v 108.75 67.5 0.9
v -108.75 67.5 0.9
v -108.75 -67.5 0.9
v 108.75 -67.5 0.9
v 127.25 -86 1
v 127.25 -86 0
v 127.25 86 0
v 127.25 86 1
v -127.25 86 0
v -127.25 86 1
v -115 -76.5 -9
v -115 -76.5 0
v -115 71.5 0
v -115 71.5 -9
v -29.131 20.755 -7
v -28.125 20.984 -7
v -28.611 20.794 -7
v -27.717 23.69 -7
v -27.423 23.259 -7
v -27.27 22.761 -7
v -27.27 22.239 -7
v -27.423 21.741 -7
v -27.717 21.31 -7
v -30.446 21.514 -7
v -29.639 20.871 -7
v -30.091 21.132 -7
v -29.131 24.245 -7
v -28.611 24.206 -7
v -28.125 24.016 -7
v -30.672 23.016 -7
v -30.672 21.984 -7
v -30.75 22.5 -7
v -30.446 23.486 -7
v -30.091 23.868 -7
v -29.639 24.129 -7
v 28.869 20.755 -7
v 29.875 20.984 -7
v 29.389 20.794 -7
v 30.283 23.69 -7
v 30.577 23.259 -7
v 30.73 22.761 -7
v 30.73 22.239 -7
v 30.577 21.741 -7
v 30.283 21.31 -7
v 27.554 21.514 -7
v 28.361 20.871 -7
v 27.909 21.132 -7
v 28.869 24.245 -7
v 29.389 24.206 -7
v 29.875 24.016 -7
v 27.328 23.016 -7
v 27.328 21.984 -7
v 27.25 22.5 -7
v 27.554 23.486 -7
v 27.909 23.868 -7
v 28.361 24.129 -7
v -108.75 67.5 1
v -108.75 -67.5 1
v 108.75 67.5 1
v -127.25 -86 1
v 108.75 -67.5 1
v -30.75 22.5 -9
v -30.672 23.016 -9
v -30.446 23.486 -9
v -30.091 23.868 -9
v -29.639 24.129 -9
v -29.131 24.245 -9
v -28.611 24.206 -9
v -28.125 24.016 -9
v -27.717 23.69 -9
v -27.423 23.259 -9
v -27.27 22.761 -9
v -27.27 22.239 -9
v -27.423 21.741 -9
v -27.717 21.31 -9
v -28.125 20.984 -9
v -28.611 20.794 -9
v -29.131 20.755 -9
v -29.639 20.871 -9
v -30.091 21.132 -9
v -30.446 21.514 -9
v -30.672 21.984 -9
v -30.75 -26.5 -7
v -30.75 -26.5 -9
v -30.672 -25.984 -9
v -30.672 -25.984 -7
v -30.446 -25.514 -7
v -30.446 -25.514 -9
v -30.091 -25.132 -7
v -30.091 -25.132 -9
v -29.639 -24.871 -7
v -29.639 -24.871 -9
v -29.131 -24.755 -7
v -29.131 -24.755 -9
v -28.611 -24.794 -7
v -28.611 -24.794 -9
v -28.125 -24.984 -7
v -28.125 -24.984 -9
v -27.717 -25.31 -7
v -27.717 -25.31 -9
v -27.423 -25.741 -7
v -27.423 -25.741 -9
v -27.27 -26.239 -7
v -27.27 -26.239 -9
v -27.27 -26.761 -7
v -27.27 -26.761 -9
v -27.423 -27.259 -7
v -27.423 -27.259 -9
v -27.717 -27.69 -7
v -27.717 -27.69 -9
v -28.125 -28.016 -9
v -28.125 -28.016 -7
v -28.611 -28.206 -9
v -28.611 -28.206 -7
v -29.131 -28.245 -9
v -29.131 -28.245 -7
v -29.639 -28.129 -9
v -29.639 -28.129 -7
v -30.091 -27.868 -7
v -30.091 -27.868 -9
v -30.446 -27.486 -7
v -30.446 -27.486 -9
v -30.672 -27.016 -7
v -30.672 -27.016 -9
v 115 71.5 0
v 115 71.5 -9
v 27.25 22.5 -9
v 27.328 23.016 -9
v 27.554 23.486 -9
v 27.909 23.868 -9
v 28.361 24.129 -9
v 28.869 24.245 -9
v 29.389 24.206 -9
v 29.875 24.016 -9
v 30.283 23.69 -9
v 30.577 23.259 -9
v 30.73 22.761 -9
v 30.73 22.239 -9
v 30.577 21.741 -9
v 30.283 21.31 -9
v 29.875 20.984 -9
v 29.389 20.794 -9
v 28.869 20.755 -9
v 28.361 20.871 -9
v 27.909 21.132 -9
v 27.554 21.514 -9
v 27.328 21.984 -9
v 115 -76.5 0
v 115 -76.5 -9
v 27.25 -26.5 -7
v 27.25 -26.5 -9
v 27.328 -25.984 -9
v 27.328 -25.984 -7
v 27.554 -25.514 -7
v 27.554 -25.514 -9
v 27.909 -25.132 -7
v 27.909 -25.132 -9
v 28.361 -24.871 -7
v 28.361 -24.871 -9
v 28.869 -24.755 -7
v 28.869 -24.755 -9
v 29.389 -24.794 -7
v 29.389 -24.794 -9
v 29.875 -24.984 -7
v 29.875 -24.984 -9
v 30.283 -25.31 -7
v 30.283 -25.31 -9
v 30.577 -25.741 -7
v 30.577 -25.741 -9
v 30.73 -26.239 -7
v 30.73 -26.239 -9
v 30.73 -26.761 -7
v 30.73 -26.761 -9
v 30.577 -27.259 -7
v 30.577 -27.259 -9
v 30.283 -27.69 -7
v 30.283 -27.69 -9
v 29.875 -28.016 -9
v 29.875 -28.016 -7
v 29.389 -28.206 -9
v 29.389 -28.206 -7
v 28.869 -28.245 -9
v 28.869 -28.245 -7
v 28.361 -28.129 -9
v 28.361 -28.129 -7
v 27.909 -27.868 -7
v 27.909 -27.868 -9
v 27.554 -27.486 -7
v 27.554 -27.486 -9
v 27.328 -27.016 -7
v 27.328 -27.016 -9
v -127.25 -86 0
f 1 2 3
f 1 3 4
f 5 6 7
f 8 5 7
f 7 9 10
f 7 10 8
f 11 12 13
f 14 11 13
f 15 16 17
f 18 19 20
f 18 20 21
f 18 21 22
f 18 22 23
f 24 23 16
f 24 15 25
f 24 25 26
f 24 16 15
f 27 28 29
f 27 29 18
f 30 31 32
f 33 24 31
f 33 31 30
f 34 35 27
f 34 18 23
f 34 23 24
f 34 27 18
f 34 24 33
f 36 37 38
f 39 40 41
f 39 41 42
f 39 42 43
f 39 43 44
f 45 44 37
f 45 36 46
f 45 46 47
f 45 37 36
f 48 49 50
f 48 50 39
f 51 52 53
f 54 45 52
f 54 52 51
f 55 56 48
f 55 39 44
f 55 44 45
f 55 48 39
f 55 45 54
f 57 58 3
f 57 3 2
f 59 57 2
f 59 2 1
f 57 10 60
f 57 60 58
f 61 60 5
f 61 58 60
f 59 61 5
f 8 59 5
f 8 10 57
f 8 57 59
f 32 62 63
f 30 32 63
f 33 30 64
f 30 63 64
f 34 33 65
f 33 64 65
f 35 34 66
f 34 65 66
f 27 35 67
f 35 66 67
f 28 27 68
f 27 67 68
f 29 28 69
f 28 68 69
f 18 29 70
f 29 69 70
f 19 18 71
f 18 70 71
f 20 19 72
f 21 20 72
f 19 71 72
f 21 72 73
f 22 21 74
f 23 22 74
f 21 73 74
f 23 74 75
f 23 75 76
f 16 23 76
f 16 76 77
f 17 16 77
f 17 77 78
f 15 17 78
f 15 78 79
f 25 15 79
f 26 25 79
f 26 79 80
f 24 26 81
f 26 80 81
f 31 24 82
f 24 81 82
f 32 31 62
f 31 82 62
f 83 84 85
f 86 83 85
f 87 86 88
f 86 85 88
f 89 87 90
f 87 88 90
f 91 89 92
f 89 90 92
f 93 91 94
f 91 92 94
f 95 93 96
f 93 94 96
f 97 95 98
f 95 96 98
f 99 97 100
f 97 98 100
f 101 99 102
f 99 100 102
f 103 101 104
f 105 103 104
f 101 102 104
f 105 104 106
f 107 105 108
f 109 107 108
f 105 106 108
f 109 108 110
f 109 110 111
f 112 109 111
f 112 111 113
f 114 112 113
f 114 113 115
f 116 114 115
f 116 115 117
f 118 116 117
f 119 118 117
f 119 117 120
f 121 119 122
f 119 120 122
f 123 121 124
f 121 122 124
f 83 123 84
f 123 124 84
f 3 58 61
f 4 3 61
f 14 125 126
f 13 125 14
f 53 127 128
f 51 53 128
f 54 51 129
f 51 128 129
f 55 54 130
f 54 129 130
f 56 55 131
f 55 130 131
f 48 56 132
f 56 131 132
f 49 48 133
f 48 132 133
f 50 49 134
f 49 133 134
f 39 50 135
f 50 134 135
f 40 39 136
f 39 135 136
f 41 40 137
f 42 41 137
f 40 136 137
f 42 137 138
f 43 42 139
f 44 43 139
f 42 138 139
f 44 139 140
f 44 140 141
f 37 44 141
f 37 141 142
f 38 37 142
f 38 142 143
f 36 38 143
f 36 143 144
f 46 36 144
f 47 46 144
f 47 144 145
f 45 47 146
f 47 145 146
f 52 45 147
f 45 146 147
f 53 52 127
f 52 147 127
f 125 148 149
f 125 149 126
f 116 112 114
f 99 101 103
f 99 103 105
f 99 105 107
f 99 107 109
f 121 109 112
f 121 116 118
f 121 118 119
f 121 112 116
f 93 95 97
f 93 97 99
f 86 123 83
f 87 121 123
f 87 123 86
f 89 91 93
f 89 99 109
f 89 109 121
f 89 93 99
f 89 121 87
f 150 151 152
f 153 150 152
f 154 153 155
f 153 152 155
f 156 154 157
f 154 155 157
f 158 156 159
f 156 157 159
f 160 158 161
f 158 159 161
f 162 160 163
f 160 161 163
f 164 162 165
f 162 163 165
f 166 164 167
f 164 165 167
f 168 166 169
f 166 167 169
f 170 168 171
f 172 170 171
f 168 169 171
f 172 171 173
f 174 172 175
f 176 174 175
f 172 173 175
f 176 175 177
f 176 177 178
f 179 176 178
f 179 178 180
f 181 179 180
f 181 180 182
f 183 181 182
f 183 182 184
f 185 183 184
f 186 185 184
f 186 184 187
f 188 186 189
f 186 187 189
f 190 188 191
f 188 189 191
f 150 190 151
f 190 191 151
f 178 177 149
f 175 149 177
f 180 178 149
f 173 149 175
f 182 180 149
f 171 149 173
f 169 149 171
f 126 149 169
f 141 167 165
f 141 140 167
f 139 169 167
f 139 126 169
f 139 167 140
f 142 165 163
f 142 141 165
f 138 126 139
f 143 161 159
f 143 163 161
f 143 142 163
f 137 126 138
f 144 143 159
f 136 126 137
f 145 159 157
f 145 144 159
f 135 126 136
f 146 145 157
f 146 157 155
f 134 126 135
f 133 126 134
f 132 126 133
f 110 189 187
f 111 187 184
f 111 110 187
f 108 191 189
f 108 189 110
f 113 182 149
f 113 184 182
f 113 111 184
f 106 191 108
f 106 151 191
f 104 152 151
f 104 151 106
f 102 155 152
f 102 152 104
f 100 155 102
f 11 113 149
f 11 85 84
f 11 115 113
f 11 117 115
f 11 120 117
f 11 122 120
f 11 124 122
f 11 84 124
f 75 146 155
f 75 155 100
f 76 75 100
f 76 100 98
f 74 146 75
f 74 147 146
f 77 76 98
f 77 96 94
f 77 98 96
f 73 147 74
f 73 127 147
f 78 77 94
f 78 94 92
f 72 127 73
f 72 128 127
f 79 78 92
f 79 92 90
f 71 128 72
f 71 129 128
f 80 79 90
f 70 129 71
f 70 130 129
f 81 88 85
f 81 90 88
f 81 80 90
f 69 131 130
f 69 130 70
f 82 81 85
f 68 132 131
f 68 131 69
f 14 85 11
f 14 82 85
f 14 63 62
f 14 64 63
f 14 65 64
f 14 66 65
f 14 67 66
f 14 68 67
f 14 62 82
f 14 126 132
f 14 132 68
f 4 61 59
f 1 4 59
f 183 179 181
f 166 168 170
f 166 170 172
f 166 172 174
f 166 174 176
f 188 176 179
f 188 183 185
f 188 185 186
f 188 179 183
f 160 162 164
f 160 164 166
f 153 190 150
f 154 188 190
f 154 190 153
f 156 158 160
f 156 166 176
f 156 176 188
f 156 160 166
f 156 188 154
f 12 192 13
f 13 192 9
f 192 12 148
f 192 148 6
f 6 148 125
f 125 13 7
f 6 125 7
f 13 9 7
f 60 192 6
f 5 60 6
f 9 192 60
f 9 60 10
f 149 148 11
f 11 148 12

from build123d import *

# Parameters (mm, degrees)
SKETCH1_W           = 254.5
SKETCH1_H           = 172
BOSS_EXTRUDE1_DEPTH = 1
SKETCH2_W           = 230
SKETCH2_H           = 148
BOSS_EXTRUDE2_DEPTH = 9
SKETCH3_R           = 1.75
CUT_EXTRUDE1_DEPTH  = 2
SKETCH4_W           = 217.5
SKETCH4_H           = 135
CUT_EXTRUDE2_DEPTH  = 0.1


with BuildPart() as part:
    # Sketch1 → Boss-Extrude1 (new body)
    with BuildSketch(Plane.XY):
        Rectangle(SKETCH1_W, SKETCH1_H)
    extrude(amount=BOSS_EXTRUDE1_DEPTH)

    # Sketch2 → Boss-Extrude2 (add)
    with BuildSketch(Plane(origin=(0, 0, 0), x_dir=(-1, 0, 0), z_dir=(0, 0, -1))):
        with Locations((0, -2.5)):
            Rectangle(SKETCH2_W, SKETCH2_H)
    extrude(amount=BOSS_EXTRUDE2_DEPTH)

    # Sketch3 → Cut-Extrude1 (cut)
    with BuildSketch(Plane(origin=(0, 0, -9), x_dir=(-1, 0, 0), z_dir=(0, 0, -1))):
        with Locations((29, -26.5)):
            Circle(SKETCH3_R)
        with Locations((-29, -26.5)):
            Circle(SKETCH3_R)
        with Locations((-29, 22.5)):
            Circle(SKETCH3_R)
        with Locations((29, 22.5)):
            Circle(SKETCH3_R)
    extrude(amount=-CUT_EXTRUDE1_DEPTH, mode=Mode.SUBTRACT)

    # Sketch4 → Cut-Extrude2 (cut)
    with BuildSketch(Plane.XY.offset(1)):
        Rectangle(SKETCH4_W, SKETCH4_H)
    extrude(amount=-CUT_EXTRUDE2_DEPTH, mode=Mode.SUBTRACT)


solid = part.part
